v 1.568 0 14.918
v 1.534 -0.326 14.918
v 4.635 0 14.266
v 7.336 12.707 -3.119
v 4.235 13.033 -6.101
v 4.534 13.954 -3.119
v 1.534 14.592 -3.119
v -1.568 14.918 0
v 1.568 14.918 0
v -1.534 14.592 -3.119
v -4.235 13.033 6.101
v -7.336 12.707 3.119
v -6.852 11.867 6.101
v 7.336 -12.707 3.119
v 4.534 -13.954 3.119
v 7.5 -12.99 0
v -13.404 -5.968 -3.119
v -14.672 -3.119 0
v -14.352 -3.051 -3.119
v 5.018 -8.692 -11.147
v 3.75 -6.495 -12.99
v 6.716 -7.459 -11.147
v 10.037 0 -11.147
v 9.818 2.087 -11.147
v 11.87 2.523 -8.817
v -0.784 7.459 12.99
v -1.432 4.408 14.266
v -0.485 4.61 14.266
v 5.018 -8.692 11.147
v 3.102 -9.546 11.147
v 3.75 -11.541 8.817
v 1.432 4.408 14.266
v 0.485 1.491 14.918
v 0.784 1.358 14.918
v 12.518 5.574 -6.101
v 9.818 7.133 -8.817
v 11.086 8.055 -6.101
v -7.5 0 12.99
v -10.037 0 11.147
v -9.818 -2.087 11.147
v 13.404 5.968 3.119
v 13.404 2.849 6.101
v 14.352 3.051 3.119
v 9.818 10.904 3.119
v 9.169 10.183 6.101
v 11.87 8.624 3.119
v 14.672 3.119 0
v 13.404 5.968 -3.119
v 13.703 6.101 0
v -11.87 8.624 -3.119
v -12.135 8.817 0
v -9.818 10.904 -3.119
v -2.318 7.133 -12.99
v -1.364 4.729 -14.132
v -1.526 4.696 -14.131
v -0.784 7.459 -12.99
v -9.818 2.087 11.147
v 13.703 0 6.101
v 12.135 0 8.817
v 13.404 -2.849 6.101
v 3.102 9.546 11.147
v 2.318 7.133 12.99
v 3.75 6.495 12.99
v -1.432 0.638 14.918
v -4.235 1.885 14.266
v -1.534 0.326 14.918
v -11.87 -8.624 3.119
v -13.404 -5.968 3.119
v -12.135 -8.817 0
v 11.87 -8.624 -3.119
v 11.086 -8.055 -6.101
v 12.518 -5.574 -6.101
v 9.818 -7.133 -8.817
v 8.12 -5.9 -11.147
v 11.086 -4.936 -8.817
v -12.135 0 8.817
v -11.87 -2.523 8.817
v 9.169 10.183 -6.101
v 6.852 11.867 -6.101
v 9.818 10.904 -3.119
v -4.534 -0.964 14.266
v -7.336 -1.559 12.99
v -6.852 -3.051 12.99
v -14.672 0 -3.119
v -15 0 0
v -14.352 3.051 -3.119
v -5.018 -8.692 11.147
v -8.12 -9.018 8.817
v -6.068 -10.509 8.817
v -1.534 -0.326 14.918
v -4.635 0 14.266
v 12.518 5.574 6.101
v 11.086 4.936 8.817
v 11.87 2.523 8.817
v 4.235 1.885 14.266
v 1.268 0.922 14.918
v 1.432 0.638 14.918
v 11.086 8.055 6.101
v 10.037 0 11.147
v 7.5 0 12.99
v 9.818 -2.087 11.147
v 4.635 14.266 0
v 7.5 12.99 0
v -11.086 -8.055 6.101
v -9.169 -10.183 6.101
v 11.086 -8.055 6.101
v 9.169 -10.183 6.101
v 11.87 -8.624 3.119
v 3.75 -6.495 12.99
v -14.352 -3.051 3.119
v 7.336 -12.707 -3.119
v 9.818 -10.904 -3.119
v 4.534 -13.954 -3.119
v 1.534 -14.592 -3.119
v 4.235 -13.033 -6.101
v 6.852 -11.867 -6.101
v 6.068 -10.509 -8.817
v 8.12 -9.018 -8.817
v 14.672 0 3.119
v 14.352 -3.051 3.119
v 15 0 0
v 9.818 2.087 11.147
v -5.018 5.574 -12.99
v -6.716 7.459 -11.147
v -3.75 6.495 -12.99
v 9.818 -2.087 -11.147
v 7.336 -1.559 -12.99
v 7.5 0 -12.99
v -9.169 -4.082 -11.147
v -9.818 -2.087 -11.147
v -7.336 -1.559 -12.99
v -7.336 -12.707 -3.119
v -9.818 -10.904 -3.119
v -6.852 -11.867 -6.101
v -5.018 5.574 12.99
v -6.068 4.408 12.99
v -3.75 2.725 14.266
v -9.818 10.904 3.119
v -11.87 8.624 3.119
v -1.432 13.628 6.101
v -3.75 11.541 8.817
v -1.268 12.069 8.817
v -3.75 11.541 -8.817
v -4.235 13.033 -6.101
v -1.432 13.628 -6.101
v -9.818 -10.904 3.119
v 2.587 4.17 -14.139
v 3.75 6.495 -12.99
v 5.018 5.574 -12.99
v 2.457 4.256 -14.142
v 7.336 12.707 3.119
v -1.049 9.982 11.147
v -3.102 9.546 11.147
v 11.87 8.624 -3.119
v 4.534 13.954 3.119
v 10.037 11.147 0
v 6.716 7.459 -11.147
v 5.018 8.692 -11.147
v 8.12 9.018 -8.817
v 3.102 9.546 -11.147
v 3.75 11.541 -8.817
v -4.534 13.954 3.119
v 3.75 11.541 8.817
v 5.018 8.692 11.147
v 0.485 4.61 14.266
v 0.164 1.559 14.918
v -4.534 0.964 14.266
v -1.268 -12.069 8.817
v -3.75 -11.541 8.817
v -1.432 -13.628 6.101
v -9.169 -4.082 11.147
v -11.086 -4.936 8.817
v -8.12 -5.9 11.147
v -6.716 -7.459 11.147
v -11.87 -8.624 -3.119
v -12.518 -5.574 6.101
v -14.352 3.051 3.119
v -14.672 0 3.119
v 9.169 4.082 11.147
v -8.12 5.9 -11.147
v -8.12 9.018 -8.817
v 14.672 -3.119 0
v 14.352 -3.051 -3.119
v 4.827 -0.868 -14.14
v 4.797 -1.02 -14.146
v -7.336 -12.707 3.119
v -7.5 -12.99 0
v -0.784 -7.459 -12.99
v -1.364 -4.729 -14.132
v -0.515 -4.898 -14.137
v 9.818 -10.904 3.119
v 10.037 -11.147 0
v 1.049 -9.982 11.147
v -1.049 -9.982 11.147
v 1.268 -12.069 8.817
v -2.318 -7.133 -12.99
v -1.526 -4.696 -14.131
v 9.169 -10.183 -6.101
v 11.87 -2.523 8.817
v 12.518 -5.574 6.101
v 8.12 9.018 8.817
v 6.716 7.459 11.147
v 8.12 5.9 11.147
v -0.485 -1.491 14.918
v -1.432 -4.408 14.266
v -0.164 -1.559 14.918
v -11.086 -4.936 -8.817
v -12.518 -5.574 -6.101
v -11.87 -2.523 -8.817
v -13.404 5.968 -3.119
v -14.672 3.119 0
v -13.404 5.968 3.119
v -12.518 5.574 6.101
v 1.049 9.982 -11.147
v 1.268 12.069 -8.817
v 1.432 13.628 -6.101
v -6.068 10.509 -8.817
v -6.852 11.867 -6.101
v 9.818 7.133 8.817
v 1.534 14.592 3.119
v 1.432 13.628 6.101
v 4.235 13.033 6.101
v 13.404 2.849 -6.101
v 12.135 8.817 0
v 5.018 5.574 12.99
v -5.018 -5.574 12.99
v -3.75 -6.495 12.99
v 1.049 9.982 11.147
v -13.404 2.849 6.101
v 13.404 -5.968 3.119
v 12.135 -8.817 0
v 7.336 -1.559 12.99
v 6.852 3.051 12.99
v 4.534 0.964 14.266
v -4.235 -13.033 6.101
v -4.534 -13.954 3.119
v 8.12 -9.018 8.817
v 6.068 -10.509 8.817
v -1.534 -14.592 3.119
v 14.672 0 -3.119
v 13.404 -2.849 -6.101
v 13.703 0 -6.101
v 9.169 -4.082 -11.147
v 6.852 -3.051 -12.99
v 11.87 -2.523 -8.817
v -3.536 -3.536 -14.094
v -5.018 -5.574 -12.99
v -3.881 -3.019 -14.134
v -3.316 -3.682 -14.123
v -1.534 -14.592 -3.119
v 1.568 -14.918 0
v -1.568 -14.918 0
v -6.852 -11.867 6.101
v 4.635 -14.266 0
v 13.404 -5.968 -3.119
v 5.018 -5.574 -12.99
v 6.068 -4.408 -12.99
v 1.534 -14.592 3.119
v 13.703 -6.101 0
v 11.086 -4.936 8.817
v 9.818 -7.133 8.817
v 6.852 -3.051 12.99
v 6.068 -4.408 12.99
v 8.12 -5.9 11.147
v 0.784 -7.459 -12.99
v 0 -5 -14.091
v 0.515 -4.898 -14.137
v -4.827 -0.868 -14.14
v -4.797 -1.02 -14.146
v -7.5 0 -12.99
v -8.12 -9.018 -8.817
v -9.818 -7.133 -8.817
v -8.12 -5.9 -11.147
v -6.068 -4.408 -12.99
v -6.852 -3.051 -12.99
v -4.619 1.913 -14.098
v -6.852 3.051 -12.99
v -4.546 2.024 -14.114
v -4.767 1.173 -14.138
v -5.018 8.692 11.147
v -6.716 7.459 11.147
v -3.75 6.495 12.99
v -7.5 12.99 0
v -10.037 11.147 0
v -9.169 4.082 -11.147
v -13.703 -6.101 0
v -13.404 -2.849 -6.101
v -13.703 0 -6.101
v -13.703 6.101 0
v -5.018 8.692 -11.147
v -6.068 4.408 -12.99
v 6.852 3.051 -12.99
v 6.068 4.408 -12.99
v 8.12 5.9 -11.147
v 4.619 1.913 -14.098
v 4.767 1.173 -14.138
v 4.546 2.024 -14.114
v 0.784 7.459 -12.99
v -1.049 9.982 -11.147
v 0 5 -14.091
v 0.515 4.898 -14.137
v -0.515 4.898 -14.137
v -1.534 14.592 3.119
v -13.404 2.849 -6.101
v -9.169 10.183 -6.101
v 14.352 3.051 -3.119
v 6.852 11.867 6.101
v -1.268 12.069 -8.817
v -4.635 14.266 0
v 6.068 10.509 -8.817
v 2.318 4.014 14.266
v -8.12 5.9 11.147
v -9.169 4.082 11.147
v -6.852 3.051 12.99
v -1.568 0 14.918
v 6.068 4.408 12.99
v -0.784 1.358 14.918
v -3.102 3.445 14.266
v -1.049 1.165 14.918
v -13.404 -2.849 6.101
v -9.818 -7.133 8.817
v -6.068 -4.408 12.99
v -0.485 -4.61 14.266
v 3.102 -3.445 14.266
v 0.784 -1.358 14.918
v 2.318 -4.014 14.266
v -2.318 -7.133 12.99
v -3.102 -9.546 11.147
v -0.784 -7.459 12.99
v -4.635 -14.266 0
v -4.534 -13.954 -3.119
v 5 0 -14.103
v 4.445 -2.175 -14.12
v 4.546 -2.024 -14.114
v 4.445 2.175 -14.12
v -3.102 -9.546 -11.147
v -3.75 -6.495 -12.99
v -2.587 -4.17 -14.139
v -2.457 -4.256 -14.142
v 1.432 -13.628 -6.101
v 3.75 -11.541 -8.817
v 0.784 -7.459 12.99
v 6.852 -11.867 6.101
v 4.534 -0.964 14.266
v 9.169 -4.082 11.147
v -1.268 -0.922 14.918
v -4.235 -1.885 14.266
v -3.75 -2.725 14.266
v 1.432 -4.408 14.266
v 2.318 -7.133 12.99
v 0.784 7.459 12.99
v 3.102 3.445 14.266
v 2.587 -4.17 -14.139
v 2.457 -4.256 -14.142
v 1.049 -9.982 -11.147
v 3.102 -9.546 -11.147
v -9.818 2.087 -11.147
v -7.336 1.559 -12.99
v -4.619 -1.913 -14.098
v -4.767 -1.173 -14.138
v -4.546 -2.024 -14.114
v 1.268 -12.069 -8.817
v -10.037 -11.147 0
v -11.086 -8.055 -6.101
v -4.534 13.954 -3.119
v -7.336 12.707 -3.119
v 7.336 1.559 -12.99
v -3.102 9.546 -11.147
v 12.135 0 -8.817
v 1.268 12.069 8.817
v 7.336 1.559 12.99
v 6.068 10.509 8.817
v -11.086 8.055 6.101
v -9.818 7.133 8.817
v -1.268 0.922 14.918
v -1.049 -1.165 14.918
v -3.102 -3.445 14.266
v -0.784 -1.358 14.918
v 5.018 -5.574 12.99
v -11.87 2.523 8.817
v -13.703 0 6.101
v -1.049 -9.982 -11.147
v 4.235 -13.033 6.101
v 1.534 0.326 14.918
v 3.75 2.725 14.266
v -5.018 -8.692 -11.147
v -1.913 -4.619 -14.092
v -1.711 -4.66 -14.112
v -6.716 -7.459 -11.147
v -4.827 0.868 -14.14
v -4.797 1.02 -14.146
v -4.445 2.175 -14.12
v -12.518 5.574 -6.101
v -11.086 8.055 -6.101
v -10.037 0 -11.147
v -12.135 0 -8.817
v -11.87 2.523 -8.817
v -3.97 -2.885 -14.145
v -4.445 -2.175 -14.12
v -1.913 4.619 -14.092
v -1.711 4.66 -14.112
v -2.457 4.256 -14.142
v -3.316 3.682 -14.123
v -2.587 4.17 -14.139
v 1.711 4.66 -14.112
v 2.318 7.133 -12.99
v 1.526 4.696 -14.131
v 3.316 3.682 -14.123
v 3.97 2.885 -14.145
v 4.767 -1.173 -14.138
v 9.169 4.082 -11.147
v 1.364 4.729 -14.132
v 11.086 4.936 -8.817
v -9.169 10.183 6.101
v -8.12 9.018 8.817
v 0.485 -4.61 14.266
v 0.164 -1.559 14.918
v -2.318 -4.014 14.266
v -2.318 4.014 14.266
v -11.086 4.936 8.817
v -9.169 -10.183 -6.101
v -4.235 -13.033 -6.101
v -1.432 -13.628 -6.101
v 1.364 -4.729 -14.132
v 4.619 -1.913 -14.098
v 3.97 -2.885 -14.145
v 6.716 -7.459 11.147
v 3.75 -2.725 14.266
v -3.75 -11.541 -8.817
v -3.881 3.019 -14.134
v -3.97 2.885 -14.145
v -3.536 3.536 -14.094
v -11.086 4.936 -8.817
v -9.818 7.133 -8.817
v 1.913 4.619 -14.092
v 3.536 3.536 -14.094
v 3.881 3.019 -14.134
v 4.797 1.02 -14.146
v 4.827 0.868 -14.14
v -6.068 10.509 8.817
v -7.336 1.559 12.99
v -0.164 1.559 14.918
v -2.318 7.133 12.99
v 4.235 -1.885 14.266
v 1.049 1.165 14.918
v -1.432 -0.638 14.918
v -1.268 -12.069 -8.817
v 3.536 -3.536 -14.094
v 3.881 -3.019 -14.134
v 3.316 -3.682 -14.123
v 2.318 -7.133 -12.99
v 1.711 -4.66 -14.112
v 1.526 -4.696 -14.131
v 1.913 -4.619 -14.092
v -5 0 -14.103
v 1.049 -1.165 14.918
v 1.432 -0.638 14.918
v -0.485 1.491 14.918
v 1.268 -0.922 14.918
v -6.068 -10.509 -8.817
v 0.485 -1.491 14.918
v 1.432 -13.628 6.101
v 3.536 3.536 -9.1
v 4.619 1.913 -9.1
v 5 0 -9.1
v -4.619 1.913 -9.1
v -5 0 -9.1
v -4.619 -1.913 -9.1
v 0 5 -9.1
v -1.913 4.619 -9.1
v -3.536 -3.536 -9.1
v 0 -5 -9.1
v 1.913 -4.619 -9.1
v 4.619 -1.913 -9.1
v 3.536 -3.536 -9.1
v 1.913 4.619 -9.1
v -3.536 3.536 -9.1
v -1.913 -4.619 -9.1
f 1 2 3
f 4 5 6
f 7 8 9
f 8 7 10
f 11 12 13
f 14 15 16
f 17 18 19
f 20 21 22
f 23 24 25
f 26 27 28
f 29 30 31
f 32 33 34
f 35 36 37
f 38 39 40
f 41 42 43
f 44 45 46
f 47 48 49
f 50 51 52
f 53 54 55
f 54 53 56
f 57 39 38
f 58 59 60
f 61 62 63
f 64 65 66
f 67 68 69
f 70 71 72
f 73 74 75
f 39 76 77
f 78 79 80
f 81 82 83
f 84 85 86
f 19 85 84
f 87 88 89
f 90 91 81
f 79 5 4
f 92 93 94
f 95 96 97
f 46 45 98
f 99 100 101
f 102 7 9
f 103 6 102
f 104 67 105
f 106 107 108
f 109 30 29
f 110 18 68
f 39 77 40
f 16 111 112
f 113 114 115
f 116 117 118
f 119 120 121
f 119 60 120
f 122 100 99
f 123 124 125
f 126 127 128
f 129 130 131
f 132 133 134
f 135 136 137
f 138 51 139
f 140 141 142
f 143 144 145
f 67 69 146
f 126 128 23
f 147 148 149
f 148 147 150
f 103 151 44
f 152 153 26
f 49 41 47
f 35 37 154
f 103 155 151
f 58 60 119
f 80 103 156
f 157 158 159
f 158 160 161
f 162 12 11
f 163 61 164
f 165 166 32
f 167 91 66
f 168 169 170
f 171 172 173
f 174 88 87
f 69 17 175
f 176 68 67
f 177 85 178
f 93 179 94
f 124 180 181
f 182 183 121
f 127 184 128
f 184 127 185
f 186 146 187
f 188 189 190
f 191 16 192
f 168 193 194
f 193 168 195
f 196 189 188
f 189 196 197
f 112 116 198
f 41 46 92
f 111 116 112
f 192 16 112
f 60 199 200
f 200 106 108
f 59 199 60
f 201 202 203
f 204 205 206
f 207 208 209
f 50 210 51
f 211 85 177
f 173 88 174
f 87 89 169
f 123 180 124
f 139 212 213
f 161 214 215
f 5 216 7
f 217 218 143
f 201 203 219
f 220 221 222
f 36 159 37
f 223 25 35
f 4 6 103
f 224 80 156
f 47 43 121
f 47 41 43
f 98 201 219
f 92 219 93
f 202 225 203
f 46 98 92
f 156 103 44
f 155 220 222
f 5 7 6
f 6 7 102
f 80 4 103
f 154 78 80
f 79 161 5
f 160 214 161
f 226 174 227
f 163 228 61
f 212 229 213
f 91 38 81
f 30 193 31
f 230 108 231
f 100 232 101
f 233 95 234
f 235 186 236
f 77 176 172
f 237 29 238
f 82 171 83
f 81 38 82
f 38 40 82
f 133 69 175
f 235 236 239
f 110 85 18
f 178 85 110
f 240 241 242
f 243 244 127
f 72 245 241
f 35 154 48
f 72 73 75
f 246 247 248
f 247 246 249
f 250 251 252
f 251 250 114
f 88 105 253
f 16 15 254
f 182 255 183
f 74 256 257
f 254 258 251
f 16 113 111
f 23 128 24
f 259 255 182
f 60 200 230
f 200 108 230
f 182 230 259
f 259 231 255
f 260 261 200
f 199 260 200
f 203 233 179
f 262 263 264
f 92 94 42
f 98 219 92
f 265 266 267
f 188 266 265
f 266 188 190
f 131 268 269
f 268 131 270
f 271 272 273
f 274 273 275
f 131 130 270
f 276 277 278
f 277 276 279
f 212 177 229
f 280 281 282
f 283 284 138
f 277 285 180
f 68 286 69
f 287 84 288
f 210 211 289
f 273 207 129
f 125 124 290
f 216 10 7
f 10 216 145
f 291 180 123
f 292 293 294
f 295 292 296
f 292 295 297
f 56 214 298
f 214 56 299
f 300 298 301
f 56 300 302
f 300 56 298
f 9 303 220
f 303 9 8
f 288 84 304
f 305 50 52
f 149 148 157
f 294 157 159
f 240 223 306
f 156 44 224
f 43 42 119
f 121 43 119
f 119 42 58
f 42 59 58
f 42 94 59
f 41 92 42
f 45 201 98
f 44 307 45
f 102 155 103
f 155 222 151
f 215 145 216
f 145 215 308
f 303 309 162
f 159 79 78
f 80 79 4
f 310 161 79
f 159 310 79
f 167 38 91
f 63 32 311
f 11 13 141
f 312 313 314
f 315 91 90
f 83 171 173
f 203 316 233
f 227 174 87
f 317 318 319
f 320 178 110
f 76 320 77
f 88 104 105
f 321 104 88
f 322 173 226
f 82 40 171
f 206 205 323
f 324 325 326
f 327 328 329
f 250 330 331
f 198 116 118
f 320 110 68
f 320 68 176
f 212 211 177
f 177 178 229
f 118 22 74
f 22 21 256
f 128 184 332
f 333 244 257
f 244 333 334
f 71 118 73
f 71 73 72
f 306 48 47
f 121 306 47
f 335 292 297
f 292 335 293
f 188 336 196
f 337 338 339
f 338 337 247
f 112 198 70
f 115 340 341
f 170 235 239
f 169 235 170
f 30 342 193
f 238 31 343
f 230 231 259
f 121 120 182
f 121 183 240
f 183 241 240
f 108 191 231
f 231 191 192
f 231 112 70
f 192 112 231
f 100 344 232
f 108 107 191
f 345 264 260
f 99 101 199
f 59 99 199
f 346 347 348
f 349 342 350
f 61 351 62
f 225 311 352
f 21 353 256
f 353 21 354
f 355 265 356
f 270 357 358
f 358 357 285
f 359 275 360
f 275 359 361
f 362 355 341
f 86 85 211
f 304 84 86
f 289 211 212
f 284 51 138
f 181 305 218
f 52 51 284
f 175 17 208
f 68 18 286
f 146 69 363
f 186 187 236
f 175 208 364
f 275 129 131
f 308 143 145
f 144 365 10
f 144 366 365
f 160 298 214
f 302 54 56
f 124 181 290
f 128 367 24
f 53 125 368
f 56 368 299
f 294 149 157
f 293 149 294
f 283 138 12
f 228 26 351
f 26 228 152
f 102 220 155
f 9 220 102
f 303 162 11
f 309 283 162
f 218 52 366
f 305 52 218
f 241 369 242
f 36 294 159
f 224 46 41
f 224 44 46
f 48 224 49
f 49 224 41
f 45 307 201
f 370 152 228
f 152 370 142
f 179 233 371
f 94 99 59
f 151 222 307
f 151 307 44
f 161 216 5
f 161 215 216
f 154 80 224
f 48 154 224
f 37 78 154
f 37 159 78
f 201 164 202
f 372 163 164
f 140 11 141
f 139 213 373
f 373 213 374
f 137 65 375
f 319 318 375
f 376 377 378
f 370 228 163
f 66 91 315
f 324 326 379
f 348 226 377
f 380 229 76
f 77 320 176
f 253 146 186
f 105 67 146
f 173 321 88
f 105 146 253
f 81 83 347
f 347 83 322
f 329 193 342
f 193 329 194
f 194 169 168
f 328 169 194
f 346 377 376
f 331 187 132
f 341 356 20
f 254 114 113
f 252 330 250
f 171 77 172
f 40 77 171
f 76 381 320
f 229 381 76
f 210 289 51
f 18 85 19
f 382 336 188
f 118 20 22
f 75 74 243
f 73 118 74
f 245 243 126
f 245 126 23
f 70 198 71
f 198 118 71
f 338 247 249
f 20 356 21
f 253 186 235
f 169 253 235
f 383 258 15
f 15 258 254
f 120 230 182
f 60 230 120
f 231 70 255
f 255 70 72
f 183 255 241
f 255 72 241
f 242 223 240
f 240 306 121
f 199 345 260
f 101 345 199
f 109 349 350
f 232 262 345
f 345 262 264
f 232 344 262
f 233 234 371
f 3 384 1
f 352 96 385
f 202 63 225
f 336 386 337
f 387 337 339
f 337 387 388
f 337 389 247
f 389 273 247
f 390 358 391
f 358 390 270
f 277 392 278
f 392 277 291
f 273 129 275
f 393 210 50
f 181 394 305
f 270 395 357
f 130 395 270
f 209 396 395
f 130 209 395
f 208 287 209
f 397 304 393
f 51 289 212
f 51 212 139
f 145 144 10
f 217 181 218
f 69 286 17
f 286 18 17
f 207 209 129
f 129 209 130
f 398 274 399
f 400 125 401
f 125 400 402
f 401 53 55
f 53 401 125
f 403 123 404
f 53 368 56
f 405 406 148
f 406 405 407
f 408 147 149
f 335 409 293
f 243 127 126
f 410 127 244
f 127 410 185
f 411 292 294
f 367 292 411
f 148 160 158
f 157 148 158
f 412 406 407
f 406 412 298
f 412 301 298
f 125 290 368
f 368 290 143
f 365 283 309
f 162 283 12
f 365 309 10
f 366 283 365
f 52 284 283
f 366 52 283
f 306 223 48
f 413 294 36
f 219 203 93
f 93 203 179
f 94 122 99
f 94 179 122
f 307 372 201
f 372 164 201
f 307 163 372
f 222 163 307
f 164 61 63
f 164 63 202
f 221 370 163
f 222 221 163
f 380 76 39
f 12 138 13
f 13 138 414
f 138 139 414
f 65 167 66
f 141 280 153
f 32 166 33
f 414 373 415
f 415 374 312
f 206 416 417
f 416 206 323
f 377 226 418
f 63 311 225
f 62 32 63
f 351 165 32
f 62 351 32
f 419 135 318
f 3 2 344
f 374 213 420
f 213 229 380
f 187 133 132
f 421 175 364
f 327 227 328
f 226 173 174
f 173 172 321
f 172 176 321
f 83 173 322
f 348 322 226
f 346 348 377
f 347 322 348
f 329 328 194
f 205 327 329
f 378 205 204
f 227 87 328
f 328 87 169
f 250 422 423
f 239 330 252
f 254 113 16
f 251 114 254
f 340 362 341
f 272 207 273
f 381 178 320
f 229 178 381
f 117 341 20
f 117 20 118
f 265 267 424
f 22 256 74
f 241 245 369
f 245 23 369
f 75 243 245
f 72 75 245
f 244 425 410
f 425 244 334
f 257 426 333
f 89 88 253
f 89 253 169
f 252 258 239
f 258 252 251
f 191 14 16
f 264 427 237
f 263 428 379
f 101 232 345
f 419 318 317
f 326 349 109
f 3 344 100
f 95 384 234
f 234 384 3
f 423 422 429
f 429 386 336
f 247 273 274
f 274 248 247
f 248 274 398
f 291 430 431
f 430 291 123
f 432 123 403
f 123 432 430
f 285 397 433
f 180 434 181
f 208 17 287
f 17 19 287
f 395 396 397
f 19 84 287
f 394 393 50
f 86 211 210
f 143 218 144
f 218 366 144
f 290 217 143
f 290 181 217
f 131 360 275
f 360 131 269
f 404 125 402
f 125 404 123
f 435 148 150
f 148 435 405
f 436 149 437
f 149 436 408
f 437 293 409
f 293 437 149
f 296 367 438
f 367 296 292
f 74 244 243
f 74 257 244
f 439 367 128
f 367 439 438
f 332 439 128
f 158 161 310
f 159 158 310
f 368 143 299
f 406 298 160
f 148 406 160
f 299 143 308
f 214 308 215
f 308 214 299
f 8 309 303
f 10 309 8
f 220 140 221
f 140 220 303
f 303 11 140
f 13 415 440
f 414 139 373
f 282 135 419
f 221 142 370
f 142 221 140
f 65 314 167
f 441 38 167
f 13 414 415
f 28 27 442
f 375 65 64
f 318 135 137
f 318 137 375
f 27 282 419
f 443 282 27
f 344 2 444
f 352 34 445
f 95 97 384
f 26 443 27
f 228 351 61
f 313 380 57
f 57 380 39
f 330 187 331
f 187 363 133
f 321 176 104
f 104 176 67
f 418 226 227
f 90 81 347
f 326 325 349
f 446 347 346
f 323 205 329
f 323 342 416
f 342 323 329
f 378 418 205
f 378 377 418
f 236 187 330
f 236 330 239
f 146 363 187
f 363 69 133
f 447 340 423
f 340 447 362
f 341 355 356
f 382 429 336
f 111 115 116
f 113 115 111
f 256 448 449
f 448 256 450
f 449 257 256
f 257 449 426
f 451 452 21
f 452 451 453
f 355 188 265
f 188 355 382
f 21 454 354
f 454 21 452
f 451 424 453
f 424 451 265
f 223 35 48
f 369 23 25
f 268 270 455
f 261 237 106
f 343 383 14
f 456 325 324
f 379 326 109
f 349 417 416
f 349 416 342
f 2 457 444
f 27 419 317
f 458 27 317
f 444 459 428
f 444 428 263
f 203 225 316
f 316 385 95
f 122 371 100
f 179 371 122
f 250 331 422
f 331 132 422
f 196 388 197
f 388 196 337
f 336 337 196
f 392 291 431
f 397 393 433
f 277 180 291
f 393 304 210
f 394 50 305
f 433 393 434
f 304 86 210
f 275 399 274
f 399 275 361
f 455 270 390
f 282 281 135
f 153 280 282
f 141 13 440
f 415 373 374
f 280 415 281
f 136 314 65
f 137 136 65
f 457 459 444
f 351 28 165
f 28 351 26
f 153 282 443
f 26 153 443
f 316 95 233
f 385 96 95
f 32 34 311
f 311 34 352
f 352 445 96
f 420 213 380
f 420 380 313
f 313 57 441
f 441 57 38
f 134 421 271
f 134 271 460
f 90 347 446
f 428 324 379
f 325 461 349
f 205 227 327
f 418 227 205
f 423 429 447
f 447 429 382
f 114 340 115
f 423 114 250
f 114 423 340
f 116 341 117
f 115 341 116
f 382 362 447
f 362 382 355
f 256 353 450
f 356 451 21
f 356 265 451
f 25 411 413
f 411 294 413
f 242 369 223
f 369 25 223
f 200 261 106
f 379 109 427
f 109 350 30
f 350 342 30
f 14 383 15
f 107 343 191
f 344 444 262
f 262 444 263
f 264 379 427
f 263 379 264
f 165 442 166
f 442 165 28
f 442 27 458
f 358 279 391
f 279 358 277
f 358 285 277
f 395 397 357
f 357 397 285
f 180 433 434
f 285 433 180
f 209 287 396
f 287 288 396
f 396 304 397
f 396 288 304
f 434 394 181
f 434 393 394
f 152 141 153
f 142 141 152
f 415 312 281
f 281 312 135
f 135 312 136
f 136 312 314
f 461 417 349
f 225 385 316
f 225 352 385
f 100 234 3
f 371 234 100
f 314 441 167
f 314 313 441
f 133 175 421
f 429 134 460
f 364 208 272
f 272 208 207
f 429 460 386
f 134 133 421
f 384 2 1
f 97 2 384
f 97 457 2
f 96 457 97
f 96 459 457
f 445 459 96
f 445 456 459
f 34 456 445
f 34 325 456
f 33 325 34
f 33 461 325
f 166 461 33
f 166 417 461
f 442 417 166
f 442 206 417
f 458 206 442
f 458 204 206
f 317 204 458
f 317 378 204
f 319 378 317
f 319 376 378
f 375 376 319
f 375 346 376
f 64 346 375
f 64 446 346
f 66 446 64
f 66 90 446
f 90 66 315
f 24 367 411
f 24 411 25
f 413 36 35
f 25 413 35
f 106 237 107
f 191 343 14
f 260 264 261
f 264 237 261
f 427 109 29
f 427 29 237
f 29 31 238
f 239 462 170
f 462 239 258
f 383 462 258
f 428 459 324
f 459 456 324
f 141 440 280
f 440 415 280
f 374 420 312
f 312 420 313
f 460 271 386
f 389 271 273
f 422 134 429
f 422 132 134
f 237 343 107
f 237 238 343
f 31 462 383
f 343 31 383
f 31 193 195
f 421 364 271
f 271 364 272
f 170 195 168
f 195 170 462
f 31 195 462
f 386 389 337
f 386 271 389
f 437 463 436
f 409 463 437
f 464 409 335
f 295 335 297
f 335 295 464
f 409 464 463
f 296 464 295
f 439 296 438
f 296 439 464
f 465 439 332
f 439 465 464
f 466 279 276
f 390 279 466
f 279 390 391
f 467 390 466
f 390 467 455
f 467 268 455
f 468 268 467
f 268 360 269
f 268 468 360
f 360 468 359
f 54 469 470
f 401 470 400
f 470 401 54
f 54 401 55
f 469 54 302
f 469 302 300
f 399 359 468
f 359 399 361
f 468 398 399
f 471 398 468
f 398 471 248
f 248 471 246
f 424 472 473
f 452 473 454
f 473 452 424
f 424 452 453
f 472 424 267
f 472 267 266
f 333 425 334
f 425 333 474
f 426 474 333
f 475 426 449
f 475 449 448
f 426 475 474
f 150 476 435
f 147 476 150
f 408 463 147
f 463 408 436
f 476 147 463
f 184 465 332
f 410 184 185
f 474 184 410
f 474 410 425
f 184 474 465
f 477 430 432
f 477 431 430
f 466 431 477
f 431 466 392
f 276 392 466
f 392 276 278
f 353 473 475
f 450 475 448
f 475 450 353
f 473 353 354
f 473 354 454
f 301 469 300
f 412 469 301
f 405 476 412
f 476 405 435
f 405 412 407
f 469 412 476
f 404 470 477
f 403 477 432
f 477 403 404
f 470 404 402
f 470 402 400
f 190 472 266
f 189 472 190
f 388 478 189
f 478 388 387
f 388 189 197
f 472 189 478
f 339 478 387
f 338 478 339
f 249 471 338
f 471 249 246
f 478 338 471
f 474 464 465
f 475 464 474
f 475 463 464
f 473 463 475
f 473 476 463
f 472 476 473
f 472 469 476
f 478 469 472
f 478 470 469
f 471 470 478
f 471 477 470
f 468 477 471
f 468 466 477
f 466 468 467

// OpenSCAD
//
// The Chimnea Cover
//
// The top ball serves as a handle and locks segments together.

top_dia = 10.0;

tab_h_top = 5.0;

module main () {
    difference () {
        sphere(r=15.0);

        translate([0, 0, -15.1])
            cylinder(tab_h_top + 1.0, r=top_dia/2);
    }
}

main();
